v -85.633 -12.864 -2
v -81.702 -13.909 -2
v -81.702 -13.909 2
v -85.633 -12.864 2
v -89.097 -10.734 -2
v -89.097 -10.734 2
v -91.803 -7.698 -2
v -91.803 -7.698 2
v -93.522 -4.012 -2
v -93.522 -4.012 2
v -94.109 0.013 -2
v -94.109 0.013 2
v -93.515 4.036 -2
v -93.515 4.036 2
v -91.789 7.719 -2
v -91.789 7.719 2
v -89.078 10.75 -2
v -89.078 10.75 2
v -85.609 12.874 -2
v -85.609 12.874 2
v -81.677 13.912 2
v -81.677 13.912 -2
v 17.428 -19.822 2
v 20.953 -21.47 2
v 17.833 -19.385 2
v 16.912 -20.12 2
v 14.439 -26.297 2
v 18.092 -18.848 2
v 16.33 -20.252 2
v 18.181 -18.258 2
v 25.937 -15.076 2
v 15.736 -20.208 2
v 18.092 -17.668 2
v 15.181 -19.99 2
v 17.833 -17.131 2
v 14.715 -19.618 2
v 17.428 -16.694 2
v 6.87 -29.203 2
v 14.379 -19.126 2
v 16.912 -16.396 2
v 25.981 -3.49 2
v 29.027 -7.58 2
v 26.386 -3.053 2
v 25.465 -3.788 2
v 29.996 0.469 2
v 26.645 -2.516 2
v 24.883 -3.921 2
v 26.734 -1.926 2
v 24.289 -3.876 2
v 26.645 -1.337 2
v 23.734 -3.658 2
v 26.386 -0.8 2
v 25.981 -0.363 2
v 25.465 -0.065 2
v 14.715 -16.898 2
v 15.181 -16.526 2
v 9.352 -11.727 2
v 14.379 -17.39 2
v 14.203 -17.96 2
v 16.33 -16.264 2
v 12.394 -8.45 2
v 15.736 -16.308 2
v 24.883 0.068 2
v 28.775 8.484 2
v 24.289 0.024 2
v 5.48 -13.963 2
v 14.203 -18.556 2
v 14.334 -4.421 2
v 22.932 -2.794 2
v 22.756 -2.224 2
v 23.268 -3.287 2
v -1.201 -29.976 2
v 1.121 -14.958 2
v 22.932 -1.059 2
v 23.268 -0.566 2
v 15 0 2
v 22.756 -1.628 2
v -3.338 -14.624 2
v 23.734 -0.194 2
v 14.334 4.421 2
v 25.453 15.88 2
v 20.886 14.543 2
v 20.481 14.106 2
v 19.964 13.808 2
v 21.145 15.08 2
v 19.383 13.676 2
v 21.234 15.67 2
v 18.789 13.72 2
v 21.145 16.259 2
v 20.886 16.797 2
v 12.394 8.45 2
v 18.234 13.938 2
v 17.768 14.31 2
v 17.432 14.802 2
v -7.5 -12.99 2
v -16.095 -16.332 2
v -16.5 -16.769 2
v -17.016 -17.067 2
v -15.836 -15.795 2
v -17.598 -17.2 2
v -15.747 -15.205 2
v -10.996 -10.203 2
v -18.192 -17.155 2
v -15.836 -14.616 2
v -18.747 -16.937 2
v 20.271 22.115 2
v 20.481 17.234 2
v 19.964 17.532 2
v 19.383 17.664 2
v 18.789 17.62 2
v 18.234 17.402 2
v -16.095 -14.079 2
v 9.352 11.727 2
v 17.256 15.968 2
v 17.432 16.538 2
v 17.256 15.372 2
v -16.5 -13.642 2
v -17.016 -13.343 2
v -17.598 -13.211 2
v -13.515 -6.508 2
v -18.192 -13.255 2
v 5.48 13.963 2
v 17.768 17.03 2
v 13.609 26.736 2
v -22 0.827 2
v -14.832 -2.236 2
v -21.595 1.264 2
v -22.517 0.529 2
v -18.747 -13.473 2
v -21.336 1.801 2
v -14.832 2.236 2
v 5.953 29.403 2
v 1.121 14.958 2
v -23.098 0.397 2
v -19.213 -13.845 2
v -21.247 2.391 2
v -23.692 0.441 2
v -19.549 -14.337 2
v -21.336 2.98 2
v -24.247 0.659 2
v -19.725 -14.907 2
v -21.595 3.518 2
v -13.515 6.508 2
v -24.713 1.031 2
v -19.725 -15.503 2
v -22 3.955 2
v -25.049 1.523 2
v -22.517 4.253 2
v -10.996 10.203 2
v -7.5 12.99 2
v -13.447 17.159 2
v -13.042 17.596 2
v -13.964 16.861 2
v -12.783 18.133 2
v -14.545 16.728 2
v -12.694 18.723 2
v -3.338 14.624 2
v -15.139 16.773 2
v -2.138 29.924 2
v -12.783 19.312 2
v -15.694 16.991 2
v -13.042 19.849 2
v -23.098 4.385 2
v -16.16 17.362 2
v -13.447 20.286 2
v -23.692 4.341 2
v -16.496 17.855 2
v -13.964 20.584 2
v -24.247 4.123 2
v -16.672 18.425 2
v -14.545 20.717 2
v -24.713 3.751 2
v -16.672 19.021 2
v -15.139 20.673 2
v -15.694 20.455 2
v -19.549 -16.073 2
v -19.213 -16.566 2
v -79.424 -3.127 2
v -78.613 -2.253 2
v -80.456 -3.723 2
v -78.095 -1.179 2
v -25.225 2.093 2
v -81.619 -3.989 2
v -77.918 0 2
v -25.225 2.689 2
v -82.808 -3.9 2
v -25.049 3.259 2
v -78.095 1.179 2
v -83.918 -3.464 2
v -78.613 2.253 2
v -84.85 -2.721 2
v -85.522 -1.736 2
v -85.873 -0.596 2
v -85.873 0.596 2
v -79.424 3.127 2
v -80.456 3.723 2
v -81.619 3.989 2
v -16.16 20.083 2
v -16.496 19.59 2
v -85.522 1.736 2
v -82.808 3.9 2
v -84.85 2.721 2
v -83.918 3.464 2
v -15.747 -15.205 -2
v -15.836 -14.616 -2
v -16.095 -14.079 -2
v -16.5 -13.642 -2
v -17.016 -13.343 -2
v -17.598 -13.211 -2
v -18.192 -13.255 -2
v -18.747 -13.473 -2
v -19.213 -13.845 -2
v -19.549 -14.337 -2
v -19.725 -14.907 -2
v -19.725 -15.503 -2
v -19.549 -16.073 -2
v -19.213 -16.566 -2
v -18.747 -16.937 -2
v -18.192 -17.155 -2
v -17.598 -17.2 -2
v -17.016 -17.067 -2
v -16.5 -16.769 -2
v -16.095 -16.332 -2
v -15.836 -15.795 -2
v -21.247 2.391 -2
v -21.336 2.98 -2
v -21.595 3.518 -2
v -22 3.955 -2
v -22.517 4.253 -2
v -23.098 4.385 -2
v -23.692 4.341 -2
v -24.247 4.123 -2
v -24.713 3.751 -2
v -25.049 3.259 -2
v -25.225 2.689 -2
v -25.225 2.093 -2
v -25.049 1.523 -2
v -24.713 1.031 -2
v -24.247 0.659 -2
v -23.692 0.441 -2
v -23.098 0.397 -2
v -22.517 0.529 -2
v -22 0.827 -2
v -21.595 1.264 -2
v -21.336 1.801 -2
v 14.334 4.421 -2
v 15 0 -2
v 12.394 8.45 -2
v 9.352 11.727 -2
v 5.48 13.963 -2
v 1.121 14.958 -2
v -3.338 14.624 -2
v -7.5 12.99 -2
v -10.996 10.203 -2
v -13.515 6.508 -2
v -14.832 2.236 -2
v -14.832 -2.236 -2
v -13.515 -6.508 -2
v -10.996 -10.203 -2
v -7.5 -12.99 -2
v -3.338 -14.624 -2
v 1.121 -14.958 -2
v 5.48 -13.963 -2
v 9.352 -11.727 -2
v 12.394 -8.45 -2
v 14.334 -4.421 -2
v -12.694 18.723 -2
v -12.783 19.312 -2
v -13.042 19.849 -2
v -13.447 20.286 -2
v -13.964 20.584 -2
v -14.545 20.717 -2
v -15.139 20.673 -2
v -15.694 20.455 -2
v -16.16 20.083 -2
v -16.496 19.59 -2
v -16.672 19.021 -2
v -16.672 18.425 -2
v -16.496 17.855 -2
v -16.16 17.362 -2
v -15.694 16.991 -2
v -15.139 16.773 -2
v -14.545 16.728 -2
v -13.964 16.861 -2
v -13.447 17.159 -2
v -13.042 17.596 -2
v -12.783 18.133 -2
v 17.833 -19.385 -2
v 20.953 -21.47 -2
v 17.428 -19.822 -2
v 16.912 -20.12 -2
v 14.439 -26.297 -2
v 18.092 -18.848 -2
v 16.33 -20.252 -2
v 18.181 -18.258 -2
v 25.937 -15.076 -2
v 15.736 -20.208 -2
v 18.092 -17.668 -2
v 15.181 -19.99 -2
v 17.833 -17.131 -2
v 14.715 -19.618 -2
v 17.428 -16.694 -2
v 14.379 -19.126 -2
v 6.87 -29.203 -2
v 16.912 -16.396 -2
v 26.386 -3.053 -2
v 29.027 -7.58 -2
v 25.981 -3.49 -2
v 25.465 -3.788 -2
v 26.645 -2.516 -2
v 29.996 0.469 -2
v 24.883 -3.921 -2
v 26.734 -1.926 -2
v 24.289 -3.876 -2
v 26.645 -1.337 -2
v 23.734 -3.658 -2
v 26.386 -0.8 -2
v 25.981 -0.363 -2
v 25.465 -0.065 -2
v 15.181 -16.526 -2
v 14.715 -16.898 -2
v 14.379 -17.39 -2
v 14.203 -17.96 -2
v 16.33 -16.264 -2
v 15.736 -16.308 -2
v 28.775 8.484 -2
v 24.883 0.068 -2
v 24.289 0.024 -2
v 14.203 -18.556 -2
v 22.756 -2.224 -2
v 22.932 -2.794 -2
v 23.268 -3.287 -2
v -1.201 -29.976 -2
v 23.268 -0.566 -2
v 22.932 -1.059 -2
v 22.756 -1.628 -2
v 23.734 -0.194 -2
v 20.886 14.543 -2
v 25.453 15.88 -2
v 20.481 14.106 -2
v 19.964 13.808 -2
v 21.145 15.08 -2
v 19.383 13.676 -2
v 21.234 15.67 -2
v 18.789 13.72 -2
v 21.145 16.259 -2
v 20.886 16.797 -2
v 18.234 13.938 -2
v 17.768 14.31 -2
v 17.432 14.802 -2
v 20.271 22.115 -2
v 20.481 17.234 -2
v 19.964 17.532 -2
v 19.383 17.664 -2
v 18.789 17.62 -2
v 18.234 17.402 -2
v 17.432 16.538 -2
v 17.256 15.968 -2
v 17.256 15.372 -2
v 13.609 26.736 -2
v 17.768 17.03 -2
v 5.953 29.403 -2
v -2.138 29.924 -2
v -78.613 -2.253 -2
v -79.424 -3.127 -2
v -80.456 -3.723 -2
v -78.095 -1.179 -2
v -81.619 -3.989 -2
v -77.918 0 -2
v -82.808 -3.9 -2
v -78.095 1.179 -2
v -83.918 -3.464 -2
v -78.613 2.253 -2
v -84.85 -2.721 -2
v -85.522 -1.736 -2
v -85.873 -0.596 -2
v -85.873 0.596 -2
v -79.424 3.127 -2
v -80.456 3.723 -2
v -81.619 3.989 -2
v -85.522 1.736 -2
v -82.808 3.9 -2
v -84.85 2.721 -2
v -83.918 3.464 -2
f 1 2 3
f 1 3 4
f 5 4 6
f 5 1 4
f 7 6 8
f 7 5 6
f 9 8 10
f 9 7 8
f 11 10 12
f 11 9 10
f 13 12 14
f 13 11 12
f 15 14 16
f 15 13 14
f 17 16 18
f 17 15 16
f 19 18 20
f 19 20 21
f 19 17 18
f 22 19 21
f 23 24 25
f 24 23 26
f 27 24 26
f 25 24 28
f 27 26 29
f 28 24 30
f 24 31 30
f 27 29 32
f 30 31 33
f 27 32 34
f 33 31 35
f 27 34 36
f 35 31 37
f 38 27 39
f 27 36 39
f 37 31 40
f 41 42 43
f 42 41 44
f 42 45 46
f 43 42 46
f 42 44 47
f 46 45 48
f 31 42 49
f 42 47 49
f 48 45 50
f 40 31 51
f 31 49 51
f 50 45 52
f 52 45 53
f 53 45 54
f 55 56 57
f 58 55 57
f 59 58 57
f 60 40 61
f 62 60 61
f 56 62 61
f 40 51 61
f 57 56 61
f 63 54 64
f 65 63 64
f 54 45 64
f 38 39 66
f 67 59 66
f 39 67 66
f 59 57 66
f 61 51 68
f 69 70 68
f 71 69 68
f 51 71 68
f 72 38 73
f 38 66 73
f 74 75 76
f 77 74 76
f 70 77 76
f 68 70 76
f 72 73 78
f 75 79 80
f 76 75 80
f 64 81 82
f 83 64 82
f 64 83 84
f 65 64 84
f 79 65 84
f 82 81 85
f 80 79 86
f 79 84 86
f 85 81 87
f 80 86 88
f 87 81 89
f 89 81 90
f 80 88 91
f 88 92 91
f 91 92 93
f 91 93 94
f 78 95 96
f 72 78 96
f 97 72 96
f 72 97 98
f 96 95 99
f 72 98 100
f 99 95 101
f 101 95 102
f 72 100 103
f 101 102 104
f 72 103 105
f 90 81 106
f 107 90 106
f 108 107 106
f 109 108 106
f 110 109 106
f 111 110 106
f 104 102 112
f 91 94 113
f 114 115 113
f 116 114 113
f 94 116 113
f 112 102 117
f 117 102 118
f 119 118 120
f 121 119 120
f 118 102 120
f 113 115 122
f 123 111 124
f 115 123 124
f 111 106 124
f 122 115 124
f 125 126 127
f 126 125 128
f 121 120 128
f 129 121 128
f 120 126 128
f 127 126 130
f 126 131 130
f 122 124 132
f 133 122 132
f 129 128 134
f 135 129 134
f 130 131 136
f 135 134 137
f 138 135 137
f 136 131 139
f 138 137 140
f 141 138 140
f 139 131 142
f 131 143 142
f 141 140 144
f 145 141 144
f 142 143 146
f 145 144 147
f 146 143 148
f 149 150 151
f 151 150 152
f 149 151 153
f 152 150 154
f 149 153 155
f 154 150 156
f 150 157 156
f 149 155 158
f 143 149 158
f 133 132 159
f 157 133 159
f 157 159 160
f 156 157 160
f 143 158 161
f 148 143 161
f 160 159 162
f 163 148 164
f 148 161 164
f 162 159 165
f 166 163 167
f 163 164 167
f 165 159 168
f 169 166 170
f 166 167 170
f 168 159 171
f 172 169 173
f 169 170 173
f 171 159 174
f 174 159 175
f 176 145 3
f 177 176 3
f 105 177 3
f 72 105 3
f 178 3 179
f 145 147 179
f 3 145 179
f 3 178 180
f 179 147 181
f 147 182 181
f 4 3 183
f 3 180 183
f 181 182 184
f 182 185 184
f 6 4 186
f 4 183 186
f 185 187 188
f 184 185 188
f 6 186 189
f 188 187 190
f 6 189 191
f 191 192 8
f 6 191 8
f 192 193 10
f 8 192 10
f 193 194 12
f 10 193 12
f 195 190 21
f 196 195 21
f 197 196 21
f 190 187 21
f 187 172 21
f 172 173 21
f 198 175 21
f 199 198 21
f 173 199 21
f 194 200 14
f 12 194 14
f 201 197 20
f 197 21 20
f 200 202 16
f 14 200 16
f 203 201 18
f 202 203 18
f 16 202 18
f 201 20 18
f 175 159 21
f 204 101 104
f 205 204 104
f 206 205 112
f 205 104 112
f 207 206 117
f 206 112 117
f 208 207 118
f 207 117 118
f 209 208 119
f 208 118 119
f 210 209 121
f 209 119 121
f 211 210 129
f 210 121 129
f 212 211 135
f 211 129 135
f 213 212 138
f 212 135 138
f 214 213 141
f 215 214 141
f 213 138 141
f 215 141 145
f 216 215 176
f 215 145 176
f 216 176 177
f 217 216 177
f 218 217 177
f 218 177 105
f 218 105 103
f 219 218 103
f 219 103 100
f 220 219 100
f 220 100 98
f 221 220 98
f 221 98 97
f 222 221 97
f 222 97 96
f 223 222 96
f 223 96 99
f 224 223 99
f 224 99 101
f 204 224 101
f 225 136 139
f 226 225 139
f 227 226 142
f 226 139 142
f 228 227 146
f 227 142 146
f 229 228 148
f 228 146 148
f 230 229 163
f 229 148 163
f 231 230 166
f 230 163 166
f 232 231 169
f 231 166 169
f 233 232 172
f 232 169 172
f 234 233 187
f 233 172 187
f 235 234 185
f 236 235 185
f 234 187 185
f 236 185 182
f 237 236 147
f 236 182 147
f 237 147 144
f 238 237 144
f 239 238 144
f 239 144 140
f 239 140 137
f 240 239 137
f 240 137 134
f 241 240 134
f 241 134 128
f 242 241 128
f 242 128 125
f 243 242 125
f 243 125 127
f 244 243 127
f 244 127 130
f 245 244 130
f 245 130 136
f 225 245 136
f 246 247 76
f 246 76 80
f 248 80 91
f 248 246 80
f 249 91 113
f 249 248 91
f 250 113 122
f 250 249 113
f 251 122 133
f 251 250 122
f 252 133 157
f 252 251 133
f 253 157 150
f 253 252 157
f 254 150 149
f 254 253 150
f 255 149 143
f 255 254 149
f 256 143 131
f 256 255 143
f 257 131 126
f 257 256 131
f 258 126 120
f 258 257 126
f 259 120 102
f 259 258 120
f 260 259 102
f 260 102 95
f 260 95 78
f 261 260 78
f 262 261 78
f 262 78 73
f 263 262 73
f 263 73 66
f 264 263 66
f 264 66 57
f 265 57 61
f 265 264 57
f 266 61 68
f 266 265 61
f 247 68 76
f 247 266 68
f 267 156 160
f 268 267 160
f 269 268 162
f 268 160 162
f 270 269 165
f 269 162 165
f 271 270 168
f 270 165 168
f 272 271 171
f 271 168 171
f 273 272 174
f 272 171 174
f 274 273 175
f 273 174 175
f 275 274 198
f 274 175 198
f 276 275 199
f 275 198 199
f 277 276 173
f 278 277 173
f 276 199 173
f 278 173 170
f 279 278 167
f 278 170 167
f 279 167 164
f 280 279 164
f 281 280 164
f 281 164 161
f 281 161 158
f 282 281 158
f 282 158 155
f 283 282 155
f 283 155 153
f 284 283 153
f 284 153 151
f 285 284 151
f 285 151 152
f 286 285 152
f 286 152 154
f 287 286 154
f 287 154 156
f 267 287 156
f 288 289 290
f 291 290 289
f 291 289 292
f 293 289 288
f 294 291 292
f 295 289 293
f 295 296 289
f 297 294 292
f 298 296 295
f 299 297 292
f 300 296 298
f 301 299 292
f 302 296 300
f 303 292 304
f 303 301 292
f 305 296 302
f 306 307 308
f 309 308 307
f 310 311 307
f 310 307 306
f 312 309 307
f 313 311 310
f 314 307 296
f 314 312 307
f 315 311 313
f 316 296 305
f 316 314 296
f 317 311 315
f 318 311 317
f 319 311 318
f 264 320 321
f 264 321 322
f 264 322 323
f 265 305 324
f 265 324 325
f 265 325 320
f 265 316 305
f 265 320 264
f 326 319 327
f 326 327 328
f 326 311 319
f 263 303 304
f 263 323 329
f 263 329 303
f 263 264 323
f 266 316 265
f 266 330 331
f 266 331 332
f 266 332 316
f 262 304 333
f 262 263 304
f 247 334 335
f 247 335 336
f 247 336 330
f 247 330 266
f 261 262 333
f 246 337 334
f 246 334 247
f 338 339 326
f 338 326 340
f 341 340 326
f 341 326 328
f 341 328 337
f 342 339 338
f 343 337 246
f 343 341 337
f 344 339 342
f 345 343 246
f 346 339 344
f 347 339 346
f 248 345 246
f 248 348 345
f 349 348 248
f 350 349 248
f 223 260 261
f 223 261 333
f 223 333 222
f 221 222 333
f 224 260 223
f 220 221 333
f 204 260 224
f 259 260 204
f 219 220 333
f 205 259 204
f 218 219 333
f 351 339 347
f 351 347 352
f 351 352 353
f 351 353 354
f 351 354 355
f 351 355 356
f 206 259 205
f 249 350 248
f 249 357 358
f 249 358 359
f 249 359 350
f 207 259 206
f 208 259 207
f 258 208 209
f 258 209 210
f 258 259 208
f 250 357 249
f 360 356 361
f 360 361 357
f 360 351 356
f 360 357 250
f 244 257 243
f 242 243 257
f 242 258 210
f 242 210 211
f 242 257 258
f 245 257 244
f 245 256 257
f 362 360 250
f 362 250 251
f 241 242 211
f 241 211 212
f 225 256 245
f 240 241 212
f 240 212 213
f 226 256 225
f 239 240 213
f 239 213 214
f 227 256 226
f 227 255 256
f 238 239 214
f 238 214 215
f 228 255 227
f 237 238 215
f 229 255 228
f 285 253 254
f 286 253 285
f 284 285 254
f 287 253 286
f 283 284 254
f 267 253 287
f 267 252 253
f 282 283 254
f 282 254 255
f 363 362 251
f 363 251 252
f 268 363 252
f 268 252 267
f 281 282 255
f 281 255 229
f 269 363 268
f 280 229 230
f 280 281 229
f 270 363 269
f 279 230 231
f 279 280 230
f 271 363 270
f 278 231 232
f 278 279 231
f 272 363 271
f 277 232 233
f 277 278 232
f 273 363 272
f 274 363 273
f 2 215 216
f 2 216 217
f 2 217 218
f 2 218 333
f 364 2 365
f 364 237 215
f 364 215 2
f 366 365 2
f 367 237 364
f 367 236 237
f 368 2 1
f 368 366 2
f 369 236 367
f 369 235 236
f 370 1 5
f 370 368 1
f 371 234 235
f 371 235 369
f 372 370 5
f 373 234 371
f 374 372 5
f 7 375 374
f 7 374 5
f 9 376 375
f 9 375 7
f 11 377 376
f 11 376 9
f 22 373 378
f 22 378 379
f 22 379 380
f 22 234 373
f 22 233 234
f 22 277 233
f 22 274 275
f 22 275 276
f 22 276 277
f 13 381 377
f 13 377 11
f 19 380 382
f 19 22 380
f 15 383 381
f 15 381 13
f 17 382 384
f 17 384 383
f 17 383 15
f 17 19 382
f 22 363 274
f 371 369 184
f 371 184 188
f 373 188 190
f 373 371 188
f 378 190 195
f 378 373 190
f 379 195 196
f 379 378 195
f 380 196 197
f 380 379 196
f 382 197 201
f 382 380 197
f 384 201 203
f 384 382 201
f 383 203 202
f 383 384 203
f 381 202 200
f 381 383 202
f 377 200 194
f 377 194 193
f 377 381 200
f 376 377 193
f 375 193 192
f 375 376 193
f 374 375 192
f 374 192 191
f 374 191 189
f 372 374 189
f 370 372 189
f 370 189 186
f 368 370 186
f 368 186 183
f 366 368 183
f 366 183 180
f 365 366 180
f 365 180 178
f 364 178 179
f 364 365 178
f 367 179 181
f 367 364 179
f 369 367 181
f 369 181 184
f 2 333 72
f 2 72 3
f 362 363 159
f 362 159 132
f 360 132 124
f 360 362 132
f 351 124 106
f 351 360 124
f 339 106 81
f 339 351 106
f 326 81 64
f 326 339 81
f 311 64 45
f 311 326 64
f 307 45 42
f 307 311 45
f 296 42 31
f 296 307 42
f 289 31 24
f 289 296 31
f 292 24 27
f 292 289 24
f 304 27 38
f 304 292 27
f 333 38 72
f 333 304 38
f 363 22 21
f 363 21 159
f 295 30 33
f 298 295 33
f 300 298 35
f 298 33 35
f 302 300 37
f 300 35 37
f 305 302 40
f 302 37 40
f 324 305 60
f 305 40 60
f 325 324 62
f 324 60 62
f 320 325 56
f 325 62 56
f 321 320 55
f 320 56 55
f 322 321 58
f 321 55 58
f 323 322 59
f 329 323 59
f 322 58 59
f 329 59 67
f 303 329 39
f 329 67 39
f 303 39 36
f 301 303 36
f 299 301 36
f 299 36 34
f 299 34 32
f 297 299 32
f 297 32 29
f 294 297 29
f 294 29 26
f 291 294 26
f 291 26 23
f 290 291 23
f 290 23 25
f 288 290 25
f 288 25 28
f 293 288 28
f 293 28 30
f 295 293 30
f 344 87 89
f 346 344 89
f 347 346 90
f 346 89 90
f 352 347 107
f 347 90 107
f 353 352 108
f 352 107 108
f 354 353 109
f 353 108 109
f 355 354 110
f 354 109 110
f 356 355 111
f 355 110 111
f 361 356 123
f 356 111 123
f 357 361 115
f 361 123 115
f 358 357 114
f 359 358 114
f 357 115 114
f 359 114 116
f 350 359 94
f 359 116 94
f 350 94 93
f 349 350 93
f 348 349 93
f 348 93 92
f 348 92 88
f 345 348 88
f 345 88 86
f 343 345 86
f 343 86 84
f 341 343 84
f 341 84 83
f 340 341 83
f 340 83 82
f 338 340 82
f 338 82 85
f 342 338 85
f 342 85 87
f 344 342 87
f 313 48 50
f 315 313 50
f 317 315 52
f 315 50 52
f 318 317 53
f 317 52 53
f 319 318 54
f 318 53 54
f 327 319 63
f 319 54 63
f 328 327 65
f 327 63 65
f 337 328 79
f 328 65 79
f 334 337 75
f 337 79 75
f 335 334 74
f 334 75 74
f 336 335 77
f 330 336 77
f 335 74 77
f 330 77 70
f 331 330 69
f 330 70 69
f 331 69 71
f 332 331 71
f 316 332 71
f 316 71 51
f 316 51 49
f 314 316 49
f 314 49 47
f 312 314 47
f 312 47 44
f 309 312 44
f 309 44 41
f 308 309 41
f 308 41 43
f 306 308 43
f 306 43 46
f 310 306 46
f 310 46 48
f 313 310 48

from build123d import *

# Parameters (mm, degrees)
EXTRUDE_START       = -2
SKETCH_1_R          = 15
SKETCH_1_R_2        = 4
EXTRUDE_1_DEPTH     = 4
SKETCH_2_R          = 2
CUT_EXTRUDE_1_DEPTH = 99.856382383


with BuildPart() as part:
    # Эскиз1 → Вытянуть1 (new body)
    with BuildSketch(Plane.XY.offset(EXTRUDE_START)):
        with BuildLine():
            Line((-81.676846175, 13.911980398), (-2.13800288, 29.923718748))
            ThreePointArc((-2.13800288, 29.923718748), (29.996326682, 0.469452404), (-1.200553025, -29.975968248))
            Line((-1.200553025, -29.975968248), (-81.702325517, -13.909086088))
            ThreePointArc((-81.702325517, -13.909086088), (-94.109421594, 0.012821602), (-81.676846175, 13.911980398))
        make_face()
        Circle(SKETCH_1_R, mode=Mode.SUBTRACT)
        with Locations((-81.917641848, 0)):
            Circle(SKETCH_1_R_2, mode=Mode.SUBTRACT)
    extrude(amount=EXTRUDE_1_DEPTH)

    # Эскиз2 → Вырез-Вытянуть1 (cut, through all)
    with BuildSketch(Plane.XY.offset(2)):
        with Locations((-17.747047674, -15.205235902)):
            Circle(SKETCH_2_R)
        with Locations((-23.247368562, 2.390973642)):
            Circle(SKETCH_2_R)
        with Locations((-14.694283668, 18.722686931)):
            Circle(SKETCH_2_R)
        with Locations((19.233639165, 15.669922925)):
            Circle(SKETCH_2_R)
        with Locations((24.733960053, -1.926286619)):
            Circle(SKETCH_2_R)
        with Locations((16.180875159, -18.257999908)):
            Circle(SKETCH_2_R)
    extrude(amount=-CUT_EXTRUDE_1_DEPTH, mode=Mode.SUBTRACT)


solid = part.part
